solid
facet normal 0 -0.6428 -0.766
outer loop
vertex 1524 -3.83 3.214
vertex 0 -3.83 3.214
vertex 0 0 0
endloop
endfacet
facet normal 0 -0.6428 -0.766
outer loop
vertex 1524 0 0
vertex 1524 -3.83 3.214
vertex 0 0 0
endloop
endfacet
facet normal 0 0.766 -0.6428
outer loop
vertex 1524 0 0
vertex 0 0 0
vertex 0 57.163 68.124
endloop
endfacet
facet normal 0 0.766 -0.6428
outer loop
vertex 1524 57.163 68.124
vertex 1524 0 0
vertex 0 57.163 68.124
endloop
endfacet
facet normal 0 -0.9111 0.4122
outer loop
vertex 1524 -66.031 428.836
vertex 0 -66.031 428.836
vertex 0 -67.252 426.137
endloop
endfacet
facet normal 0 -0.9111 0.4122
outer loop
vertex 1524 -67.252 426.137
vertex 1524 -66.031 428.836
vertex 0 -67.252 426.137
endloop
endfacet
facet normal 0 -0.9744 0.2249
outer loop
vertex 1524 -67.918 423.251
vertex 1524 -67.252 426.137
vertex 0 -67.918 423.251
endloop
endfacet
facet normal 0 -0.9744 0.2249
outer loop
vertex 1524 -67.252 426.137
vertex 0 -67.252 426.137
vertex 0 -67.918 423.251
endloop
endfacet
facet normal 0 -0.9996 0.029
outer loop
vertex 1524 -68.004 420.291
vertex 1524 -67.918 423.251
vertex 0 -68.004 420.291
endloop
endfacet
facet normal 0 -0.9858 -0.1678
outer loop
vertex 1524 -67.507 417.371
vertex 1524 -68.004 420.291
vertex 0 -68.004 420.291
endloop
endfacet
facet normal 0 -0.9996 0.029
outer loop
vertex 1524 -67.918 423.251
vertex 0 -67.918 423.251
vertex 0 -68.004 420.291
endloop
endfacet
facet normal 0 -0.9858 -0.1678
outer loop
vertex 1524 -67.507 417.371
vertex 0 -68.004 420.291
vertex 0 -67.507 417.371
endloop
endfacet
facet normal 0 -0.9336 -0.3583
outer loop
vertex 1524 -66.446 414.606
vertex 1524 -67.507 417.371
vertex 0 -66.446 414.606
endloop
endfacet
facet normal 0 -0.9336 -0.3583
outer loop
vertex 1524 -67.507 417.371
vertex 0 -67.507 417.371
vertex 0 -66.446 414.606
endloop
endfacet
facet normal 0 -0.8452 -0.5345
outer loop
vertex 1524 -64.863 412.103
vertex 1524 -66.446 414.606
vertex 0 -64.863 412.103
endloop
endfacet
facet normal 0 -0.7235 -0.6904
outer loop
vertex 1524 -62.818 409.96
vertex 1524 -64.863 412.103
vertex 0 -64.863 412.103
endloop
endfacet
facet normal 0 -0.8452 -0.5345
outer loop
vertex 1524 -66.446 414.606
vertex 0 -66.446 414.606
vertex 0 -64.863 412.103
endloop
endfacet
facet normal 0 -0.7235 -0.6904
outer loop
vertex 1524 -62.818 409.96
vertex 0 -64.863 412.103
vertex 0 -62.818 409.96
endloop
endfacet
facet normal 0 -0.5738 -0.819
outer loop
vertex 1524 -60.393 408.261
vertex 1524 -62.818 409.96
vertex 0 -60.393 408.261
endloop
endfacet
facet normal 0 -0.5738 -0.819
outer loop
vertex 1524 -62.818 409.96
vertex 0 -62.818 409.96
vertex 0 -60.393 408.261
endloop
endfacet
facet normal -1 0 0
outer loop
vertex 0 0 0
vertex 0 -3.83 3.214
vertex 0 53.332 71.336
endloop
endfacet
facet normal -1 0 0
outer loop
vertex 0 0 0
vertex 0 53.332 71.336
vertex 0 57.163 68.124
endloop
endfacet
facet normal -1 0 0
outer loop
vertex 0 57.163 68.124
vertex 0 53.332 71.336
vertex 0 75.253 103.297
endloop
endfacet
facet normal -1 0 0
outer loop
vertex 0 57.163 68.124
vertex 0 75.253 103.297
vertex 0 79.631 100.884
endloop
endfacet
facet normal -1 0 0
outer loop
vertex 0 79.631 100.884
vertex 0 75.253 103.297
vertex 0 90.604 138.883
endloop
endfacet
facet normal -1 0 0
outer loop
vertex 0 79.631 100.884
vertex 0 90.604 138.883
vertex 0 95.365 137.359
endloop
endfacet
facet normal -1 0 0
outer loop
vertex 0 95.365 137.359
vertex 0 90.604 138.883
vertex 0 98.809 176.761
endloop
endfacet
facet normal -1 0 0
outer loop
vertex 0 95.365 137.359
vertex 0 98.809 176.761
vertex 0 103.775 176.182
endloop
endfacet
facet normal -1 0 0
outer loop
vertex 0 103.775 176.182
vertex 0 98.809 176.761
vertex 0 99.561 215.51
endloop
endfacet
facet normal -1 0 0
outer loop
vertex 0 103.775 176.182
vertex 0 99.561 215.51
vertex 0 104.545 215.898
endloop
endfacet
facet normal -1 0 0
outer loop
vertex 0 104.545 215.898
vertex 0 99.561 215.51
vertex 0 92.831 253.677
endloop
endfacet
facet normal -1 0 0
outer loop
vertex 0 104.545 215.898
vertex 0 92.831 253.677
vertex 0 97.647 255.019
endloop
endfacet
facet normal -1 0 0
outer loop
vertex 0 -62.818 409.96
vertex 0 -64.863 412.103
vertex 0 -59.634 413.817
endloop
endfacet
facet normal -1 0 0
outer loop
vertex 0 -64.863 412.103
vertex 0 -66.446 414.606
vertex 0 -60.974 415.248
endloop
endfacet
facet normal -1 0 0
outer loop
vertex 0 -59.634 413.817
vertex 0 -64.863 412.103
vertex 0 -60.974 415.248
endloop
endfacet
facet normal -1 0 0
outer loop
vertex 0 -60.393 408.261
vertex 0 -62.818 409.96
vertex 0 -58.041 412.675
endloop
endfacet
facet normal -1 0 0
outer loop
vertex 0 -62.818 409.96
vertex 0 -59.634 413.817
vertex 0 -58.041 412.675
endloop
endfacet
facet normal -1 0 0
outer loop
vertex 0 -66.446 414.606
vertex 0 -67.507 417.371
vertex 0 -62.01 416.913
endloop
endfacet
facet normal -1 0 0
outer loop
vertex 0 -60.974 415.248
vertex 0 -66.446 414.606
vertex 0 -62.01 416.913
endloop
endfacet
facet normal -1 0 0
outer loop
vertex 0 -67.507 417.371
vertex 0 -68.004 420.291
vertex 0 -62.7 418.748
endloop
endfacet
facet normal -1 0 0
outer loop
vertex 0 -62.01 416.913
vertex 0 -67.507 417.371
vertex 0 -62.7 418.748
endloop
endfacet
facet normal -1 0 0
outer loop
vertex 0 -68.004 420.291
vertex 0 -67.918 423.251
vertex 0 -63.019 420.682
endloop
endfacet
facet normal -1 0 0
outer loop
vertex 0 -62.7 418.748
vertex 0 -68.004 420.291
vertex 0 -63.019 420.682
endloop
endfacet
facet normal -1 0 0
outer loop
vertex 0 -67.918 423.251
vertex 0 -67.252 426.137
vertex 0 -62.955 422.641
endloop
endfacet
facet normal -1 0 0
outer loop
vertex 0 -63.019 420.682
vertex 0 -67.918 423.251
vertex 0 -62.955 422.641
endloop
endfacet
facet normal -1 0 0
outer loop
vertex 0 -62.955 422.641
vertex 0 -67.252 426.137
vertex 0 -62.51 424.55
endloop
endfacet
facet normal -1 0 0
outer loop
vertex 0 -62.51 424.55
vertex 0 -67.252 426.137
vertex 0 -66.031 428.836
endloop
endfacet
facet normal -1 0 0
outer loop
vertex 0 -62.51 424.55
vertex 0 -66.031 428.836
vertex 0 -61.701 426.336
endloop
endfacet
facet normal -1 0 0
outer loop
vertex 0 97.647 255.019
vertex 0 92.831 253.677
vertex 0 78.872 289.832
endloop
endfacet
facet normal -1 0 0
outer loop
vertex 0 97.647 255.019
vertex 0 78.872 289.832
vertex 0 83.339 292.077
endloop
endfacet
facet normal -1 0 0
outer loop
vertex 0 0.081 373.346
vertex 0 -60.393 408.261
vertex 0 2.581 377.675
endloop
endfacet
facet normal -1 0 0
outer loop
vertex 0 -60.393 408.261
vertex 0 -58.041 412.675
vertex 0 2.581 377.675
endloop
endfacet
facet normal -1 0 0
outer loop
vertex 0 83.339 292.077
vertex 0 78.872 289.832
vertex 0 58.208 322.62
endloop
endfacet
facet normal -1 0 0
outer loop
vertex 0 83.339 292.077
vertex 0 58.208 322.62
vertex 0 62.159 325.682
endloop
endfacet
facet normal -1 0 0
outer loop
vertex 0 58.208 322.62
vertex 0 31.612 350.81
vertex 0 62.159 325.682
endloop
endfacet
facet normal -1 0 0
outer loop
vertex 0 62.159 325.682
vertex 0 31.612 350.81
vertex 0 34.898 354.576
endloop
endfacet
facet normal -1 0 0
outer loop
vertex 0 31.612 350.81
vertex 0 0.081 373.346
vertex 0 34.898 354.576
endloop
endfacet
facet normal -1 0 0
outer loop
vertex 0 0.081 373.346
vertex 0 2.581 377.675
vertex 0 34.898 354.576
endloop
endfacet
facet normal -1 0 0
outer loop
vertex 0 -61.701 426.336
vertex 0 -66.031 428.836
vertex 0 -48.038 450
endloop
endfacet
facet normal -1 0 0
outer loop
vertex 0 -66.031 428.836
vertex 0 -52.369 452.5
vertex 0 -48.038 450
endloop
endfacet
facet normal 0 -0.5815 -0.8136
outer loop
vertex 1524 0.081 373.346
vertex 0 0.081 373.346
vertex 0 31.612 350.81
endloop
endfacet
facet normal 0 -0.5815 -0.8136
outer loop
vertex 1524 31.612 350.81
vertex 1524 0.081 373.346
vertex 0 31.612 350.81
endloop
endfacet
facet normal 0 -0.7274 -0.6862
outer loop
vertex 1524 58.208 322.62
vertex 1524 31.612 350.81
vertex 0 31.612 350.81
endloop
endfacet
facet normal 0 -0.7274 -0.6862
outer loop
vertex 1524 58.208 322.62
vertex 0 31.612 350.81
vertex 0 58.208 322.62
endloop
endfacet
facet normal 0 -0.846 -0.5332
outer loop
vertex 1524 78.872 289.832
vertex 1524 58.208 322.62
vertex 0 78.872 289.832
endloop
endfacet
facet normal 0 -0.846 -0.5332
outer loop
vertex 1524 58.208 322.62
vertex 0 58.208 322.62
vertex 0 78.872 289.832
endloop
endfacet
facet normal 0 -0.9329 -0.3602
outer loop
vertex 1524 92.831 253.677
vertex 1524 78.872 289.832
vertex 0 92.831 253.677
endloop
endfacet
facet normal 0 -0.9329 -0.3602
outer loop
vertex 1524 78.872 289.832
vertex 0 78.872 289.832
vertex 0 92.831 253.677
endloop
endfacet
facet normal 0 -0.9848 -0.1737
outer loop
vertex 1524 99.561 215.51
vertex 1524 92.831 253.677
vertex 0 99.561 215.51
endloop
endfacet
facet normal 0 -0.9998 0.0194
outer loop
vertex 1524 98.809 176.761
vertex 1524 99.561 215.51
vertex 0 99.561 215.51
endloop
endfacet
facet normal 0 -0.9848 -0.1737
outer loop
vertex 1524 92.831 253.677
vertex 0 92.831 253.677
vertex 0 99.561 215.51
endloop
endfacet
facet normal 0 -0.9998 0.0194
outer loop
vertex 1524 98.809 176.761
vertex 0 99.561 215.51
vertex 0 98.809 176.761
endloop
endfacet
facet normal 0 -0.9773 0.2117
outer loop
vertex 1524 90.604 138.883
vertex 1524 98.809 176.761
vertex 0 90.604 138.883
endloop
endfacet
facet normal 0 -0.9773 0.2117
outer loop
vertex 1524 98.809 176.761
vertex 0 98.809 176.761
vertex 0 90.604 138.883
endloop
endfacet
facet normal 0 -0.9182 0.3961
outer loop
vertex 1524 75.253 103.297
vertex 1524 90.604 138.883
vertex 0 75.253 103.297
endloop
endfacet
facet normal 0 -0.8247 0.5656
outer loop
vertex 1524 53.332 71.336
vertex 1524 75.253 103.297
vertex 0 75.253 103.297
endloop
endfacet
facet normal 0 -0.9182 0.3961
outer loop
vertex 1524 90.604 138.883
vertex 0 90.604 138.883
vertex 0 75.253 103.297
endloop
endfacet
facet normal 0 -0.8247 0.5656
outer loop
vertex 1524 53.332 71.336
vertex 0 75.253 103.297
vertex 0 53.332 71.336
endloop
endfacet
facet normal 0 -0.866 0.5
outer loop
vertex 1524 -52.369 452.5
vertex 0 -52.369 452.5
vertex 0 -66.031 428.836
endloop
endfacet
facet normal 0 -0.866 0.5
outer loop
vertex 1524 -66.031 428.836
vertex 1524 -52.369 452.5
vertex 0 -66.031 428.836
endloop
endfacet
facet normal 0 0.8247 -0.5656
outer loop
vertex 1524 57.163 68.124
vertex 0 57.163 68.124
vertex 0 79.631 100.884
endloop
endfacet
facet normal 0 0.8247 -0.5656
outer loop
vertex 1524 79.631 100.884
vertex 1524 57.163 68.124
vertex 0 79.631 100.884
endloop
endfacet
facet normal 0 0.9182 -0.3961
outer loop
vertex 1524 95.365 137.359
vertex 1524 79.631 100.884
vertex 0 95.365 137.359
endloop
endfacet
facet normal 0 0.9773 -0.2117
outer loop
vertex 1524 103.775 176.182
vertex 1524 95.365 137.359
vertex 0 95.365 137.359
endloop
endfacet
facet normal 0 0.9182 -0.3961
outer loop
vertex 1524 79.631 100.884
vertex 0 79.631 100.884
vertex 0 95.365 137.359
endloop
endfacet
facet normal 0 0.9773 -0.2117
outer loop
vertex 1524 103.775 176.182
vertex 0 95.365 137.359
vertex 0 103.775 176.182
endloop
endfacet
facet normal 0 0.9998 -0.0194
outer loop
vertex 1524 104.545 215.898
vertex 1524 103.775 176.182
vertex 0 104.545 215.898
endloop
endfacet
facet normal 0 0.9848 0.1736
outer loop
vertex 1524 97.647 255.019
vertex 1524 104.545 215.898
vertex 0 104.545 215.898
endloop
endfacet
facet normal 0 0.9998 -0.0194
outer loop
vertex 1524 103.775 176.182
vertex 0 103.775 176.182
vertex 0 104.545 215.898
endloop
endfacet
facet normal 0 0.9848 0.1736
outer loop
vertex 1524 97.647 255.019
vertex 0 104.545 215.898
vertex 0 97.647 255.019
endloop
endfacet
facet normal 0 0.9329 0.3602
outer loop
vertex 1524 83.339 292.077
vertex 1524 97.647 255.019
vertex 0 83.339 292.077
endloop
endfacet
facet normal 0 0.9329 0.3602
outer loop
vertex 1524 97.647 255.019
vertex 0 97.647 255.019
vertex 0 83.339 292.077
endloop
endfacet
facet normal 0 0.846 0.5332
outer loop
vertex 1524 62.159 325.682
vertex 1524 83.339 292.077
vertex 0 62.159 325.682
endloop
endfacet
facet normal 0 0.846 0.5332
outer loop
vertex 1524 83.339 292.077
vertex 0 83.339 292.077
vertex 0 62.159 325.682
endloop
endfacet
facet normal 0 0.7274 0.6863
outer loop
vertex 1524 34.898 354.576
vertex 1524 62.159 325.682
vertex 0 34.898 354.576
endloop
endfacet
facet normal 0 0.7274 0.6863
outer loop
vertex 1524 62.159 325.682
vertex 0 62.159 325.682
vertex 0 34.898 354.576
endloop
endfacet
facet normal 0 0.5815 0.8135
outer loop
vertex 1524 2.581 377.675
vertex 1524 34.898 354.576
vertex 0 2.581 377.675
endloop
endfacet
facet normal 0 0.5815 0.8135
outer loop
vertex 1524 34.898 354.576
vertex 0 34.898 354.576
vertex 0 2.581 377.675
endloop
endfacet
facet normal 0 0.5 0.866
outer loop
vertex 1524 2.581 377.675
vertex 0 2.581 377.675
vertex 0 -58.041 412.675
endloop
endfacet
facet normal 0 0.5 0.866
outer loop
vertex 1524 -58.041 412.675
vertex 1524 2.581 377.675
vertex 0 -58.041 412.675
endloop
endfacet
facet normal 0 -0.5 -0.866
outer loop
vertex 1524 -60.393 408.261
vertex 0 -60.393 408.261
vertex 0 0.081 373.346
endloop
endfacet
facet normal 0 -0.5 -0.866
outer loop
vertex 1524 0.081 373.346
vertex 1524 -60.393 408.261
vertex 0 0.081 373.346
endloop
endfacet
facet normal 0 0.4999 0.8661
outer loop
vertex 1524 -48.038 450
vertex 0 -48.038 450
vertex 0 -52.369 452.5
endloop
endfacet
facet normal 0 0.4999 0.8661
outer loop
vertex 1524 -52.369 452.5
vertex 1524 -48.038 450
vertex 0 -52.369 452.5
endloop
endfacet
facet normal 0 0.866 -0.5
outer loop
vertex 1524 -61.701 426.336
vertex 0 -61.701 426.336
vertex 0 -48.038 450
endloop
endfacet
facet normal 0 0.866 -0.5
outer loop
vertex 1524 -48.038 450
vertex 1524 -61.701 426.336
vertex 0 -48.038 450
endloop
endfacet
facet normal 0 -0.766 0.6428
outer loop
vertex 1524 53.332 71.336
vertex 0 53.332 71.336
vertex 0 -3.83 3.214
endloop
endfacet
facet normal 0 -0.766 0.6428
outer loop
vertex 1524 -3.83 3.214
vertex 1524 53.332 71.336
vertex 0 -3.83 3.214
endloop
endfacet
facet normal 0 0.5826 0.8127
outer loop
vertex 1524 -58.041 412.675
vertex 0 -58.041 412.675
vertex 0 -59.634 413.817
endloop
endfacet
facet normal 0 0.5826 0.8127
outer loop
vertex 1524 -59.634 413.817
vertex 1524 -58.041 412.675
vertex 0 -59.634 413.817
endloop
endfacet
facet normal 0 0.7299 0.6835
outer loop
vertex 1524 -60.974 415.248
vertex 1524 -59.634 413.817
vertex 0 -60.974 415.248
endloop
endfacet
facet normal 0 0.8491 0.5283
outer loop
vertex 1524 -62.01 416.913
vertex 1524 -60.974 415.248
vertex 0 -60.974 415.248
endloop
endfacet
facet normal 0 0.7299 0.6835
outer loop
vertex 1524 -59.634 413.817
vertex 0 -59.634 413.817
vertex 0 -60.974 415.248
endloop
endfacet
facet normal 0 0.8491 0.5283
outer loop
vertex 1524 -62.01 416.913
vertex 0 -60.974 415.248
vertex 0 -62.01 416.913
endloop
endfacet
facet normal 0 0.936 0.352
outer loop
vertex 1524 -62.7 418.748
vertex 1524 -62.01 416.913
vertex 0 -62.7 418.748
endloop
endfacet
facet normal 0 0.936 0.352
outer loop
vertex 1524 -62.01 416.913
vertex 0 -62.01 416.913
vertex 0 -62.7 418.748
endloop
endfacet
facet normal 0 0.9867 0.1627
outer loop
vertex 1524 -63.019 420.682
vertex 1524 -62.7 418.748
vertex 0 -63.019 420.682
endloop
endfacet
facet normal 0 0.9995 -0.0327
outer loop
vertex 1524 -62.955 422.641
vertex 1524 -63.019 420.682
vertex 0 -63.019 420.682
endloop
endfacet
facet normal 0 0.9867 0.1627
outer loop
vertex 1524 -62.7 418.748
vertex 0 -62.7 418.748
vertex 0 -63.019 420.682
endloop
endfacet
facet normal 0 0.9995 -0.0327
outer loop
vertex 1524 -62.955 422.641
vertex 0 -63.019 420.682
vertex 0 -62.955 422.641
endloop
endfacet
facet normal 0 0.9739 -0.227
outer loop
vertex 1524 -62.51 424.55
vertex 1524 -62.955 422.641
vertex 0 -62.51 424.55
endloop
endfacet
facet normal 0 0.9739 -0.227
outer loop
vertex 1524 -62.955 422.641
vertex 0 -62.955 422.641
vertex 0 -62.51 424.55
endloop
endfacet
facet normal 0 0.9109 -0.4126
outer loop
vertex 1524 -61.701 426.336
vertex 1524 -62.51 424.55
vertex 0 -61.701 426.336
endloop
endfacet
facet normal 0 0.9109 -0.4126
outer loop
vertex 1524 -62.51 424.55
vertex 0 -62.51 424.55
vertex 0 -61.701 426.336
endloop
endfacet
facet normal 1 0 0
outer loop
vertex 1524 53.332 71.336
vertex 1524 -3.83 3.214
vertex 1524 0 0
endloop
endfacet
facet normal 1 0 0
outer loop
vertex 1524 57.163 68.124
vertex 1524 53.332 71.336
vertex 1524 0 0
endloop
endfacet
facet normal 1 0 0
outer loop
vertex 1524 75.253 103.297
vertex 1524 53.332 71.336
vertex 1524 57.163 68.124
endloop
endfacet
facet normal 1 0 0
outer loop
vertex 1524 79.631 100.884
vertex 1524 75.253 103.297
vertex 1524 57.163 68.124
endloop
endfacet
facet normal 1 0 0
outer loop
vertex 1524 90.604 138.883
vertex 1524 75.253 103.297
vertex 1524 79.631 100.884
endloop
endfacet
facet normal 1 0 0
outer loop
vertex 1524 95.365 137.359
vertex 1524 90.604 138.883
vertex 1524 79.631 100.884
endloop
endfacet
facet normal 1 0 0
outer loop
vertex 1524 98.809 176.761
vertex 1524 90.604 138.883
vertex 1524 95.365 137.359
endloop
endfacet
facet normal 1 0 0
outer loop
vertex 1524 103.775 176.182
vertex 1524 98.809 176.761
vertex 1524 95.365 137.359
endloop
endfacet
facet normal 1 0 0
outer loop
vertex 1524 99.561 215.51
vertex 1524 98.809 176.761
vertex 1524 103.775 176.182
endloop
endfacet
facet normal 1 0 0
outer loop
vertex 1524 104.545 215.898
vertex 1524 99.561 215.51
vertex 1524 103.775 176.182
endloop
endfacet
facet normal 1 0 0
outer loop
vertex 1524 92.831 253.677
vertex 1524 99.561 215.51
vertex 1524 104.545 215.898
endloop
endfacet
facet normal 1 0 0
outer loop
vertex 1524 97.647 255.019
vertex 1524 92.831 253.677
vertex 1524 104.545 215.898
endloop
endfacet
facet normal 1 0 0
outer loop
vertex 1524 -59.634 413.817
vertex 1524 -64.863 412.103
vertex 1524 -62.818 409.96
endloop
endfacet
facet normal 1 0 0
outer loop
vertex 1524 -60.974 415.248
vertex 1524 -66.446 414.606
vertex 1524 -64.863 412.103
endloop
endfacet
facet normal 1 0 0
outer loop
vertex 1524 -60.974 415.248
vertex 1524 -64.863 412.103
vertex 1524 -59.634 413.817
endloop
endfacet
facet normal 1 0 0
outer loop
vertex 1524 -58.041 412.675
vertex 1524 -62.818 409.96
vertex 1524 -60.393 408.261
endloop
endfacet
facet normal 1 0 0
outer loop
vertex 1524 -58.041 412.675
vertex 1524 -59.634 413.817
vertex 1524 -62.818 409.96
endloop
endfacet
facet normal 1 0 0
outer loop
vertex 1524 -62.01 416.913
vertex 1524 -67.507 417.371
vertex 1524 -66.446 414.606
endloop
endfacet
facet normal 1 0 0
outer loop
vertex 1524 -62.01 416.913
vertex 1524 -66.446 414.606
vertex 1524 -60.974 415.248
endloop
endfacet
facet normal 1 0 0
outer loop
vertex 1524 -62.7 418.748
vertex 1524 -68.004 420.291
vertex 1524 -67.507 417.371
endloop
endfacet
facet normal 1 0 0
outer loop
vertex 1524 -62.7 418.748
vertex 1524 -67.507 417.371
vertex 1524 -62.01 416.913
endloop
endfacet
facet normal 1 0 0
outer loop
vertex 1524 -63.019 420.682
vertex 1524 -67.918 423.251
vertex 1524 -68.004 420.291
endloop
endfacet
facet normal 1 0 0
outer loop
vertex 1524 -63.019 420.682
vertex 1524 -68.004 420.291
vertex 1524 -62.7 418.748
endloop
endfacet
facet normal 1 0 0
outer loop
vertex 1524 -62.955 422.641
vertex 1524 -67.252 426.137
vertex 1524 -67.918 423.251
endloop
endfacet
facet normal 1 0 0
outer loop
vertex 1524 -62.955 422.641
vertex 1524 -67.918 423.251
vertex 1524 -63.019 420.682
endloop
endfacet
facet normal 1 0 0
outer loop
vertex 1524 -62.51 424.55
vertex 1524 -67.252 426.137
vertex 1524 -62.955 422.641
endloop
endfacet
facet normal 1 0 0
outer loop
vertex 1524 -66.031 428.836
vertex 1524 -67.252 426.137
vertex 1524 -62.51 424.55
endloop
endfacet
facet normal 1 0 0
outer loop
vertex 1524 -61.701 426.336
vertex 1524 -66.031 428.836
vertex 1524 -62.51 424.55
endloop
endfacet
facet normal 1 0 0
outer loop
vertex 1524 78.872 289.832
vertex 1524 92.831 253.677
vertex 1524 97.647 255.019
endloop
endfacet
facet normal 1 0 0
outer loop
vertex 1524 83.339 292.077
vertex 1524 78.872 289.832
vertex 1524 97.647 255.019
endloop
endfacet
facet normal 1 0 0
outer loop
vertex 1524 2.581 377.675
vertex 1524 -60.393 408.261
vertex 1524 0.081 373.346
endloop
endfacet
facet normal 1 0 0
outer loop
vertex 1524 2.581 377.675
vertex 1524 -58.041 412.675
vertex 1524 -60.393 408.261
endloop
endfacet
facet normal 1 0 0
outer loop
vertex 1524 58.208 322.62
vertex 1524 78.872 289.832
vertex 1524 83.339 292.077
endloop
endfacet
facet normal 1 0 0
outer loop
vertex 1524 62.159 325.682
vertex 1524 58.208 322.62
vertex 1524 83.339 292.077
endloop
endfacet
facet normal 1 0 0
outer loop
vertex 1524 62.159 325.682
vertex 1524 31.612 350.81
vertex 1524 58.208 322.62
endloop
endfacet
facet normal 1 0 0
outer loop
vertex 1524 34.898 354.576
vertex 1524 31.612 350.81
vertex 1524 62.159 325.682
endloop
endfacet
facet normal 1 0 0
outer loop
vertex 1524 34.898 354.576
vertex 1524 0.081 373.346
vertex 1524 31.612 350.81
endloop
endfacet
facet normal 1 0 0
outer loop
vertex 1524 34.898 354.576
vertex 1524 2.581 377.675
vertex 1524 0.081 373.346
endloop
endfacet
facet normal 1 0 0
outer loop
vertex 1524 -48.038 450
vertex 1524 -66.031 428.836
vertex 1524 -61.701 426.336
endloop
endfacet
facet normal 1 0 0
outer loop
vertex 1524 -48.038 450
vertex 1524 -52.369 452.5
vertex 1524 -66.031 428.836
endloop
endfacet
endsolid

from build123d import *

# Parameters (mm, degrees)
F1_DEPTH = 1524


with BuildPart() as f1:
    # F0 (on Right) → F1 (new body)
    with BuildSketch(Plane.YZ):
        with BuildLine():
            Line((-3.830222, 3.213938), (0, 0))
            Line((0, 0), (57.163184, 68.12443))
            ThreePointArc((57.163184, 68.12443), (102.045095, 235.626002), (2.580983, 377.675475))
            Line((2.580983, 377.675475), (-58.040795, 412.675475))
            ThreePointArc((-58.040795, 412.675475), (-62.700053, 418.747538), (-61.701049, 426.335729))
            Line((-61.701049, 426.335729), (-48.038476, 450))
            Line((-48.038476, 450), (-52.368603, 452.5))
            Line((-52.368603, 452.5), (-66.031176, 428.835729))
            ThreePointArc((-66.031176, 428.835729), (-67.507418, 417.371282), (-60.392876, 408.261062))
            Line((-60.392876, 408.261062), (0.081466, 373.346184))
            ThreePointArc((0.081466, 373.346184), (97.122196, 234.756858), (53.332304, 71.336081))
            Line((53.332304, 71.336081), (-3.830222, 3.213938))
        make_face()
    extrude(amount=F1_DEPTH)


solid = f1.part
